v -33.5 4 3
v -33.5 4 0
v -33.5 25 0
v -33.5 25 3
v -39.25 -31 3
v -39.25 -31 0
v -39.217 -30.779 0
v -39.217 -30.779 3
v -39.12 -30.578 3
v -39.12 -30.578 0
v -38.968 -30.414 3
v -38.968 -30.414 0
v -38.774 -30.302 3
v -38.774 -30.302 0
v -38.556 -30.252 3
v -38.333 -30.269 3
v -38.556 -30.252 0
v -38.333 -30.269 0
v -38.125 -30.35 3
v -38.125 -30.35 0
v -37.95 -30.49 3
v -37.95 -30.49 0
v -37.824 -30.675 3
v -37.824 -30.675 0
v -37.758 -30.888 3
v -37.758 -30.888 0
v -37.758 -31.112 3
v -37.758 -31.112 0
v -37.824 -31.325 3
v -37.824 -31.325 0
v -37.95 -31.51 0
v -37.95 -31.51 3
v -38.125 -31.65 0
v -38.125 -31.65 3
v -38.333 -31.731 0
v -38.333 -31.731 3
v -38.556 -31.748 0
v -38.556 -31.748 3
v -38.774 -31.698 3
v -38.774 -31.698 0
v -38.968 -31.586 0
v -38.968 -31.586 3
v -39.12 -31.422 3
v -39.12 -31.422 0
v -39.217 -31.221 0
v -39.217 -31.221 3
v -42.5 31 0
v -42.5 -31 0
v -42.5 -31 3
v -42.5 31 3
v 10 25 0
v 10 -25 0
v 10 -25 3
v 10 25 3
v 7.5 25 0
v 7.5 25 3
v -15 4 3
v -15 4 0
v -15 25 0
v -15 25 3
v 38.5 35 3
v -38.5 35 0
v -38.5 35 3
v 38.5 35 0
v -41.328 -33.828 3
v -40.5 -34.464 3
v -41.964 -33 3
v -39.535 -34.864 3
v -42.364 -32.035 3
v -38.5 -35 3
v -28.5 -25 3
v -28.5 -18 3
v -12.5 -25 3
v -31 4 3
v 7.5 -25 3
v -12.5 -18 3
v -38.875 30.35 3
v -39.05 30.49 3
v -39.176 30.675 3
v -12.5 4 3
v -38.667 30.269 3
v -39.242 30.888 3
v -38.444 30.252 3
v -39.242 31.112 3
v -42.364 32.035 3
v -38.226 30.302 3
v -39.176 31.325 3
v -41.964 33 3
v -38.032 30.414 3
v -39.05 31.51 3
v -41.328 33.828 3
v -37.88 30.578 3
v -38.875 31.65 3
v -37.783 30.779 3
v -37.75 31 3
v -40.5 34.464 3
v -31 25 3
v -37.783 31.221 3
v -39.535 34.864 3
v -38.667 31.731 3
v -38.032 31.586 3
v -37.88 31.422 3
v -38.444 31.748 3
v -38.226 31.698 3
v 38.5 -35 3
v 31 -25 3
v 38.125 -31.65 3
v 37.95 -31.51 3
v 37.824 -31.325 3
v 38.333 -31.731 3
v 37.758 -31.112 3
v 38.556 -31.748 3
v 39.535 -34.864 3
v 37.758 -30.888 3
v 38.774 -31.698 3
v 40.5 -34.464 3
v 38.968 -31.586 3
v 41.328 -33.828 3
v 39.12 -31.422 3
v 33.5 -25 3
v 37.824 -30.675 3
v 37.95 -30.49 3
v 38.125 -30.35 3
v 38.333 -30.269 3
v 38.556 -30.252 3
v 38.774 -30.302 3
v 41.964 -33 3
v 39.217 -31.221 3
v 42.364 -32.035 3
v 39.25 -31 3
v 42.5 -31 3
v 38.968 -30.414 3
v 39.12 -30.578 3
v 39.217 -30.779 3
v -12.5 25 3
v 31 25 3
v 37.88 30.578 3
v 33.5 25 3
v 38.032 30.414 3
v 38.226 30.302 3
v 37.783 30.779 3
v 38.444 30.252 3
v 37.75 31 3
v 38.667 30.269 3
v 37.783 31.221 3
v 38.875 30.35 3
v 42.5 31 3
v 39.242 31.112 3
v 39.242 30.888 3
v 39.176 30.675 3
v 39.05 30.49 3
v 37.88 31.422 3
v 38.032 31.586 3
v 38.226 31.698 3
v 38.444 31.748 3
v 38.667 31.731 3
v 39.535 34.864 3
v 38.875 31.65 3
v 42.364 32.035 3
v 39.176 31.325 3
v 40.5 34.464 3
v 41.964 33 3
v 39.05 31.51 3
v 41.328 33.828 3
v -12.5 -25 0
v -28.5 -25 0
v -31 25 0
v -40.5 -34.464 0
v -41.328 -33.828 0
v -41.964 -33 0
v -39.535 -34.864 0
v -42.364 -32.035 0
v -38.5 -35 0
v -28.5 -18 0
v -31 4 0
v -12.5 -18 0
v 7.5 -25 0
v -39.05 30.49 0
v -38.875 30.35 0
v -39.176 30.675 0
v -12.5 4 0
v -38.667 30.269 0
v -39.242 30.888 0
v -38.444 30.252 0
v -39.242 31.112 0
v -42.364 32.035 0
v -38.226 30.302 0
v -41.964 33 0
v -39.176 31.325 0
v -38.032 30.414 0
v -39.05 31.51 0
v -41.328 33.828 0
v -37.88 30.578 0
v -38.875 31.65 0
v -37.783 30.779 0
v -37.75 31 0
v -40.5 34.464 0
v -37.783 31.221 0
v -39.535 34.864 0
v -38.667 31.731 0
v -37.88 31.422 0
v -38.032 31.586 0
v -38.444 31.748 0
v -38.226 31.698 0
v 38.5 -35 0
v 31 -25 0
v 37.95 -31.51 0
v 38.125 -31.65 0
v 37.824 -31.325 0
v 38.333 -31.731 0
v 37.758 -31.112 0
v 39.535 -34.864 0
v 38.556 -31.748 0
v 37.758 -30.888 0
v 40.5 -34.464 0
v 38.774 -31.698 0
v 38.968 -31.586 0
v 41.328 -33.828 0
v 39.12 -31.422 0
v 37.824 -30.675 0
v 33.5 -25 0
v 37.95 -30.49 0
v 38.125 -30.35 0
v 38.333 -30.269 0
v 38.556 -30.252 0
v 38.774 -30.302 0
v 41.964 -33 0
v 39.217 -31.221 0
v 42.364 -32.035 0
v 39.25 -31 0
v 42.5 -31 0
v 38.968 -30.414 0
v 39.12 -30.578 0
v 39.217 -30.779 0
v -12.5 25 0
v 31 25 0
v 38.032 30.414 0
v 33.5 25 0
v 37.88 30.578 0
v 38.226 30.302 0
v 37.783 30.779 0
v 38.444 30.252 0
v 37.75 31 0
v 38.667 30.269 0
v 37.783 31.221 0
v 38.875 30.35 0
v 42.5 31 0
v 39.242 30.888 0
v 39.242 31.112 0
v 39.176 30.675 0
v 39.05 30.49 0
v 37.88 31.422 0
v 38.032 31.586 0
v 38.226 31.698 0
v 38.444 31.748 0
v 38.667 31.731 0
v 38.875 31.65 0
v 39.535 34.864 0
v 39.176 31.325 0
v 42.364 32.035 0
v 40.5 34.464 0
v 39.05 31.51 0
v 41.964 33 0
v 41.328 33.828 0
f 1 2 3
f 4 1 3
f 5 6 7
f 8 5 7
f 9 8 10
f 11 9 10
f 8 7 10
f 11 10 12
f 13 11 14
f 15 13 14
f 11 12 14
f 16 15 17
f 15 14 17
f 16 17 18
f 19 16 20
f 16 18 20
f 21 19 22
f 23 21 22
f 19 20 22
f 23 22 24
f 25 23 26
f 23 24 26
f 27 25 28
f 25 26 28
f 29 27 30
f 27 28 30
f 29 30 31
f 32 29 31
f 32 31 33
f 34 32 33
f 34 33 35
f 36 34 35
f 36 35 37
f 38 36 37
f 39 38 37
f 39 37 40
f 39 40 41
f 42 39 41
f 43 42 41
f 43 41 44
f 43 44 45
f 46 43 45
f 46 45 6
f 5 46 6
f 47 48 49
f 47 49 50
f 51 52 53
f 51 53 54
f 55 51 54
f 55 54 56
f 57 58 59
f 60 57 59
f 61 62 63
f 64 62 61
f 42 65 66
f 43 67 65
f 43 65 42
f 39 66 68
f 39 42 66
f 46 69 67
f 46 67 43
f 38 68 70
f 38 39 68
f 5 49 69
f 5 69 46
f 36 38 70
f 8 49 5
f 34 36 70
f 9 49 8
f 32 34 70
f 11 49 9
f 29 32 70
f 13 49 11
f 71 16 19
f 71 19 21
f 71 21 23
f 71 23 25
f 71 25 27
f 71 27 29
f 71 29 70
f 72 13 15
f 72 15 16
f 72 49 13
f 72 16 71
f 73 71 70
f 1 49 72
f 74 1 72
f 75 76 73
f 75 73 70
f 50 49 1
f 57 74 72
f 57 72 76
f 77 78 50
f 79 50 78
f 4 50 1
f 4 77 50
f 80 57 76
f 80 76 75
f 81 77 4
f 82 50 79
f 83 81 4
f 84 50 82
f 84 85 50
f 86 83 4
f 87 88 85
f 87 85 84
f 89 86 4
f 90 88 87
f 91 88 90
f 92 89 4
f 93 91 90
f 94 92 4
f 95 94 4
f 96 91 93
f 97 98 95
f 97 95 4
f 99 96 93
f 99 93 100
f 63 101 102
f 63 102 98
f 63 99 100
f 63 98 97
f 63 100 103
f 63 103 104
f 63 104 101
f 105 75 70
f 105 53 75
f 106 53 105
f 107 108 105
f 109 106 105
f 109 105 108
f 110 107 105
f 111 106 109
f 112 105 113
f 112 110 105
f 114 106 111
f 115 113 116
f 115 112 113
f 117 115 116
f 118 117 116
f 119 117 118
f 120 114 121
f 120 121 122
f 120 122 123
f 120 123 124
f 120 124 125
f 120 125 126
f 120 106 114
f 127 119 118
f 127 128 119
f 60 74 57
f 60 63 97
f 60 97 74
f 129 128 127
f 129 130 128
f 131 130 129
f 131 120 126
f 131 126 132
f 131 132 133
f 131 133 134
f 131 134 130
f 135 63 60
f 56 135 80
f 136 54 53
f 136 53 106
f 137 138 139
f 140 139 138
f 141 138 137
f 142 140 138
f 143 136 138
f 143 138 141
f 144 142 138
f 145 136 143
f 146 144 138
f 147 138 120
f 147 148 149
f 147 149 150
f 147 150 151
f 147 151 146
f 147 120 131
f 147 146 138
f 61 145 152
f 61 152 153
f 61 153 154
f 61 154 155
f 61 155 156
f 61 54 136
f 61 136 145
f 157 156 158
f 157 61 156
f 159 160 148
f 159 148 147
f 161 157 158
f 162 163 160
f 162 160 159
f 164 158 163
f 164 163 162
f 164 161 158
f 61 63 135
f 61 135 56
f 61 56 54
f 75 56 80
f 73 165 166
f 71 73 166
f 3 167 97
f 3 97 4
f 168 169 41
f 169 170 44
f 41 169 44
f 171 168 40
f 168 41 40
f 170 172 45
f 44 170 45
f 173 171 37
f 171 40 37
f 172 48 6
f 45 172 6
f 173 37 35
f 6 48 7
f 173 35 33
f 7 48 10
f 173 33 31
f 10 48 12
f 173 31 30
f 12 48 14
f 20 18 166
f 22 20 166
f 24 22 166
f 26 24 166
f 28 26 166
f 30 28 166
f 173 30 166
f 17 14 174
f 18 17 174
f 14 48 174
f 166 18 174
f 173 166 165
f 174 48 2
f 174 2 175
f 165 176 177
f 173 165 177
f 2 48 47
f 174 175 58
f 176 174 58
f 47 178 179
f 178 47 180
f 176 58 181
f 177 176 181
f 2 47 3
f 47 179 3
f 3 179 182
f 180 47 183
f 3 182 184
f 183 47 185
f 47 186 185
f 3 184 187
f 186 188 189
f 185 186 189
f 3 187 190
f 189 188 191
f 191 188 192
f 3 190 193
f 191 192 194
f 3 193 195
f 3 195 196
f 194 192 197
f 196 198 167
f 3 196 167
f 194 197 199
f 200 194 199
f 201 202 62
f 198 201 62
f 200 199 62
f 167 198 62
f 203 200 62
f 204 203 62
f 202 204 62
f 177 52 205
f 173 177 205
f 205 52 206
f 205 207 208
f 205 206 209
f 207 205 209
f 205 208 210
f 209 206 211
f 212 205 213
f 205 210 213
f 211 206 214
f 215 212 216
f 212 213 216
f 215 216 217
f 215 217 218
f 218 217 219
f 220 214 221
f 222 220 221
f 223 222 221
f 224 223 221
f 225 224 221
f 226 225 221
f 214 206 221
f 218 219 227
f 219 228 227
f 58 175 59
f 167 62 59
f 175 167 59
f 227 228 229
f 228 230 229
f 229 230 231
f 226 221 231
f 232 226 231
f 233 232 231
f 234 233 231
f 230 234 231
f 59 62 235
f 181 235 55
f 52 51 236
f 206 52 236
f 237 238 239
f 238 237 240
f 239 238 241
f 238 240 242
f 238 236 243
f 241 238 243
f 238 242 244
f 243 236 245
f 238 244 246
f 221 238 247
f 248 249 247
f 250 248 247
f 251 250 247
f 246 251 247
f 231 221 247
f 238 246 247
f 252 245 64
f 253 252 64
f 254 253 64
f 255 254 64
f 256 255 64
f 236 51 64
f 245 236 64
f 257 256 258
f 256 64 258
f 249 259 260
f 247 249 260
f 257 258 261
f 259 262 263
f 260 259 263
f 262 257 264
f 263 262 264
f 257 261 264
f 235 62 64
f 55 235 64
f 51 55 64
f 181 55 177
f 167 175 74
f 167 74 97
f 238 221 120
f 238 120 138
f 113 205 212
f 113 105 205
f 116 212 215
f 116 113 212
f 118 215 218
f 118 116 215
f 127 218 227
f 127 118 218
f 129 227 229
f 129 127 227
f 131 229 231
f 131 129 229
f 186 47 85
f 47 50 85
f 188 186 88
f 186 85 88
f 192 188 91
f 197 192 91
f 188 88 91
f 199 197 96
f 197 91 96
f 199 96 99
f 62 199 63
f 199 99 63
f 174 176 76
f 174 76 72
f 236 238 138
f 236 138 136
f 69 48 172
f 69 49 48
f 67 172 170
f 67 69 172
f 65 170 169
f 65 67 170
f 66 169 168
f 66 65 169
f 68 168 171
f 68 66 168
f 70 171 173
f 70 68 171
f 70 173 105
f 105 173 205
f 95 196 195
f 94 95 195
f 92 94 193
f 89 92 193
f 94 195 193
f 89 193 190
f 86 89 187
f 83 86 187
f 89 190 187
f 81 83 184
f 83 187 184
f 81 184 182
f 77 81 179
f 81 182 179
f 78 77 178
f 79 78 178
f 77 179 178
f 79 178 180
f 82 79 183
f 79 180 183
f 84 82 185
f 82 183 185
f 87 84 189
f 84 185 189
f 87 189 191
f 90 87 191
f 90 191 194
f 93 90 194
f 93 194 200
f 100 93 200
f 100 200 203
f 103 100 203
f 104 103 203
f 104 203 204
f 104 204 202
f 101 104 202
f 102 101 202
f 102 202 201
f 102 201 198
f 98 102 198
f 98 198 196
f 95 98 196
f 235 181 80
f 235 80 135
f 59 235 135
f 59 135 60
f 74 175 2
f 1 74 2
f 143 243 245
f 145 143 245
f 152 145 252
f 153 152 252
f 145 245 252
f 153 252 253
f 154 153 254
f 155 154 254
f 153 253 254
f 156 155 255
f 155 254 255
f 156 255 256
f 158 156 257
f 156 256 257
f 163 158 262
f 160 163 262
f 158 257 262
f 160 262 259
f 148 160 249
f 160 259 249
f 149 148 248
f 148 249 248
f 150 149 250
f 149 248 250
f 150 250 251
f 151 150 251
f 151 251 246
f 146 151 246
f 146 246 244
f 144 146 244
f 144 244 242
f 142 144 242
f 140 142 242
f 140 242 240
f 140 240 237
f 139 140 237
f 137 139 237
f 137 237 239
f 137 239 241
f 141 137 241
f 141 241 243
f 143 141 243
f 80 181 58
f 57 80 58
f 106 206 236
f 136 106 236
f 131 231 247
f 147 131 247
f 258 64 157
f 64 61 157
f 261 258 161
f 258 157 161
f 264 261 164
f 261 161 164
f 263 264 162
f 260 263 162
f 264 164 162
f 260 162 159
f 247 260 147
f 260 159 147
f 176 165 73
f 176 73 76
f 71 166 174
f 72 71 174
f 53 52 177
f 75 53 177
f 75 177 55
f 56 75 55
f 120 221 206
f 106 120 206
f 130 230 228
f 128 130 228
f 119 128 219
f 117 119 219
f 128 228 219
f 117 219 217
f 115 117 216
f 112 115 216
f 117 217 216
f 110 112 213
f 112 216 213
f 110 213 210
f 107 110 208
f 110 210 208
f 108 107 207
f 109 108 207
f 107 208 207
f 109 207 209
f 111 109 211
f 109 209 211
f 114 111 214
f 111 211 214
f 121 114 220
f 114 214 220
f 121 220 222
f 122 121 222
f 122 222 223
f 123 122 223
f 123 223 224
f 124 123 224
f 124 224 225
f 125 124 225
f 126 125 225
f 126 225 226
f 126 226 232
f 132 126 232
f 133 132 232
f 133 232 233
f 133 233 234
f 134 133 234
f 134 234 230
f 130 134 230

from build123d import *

# Parameters (mm, degrees)
SKETCH1_W           = 85
SKETCH1_H           = 70
BOSS_EXTRUDE1_DEPTH = 3
SKETCH2_W           = 2.5
SKETCH2_H           = 50
SKETCH2_H_2         = 21
SKETCH2_W_2         = 16
SKETCH2_H_3         = 7
CUT_EXTRUDE1_DEPTH  = 56.138462075
FILLET1_R           = 4
SKETCH4_R           = 0.75
CUT_EXTRUDE3_DEPTH  = 10


with BuildPart() as part:
    # Sketch1 → Boss-Extrude1 (new body)
    with BuildSketch(Plane.XY):
        Rectangle(SKETCH1_W, SKETCH1_H)
    extrude(amount=BOSS_EXTRUDE1_DEPTH)

    # Sketch2 → Cut-Extrude1 (cut, through all)
    with BuildSketch(Plane(origin=(0, 0, 0), x_dir=(-1, 0, 0), z_dir=(0, 0, -1))):
        with Locations((-32.25, 0)):
            Rectangle(SKETCH2_W, SKETCH2_H)
        with Locations((-8.75, 0)):
            Rectangle(SKETCH2_W, SKETCH2_H)
        with Locations((13.75, 14.5)):
            Rectangle(SKETCH2_W, SKETCH2_H_2)
        with Locations((32.25, 14.5)):
            Rectangle(SKETCH2_W, SKETCH2_H_2)
        with Locations((20.5, -21.5)):
            Rectangle(SKETCH2_W_2, SKETCH2_H_3)
    extrude(amount=-CUT_EXTRUDE1_DEPTH, mode=Mode.SUBTRACT)

    # Fillet1
    fillet1_edges = [part.edges().sort_by_distance(p)[0] for p in [
        (42.5, -35, 1.5),
        (-42.5, -35, 1.5),
        (-42.5, 35, 1.5),
        (42.5, 35, 1.5),
    ]]
    fillet(fillet1_edges, radius=FILLET1_R)

    # Sketch4 → Cut-Extrude3 (cut)
    with BuildSketch(Plane(origin=(0, 0, 0), x_dir=(-1, 0, 0), z_dir=(0, 0, -1))):
        with Locations((-38.5, 31)):
            Circle(SKETCH4_R)
        with Locations(Location((38.5, 31, 0), (0, 0, 180))):
            Circle(SKETCH4_R)
        with Locations((38.5, -31)):
            Circle(SKETCH4_R)
        with Locations(Location((-38.5, -31, 0), (0, 0, 180))):
            Circle(SKETCH4_R)
    extrude(amount=-CUT_EXTRUDE3_DEPTH, mode=Mode.SUBTRACT)


solid = part.part
